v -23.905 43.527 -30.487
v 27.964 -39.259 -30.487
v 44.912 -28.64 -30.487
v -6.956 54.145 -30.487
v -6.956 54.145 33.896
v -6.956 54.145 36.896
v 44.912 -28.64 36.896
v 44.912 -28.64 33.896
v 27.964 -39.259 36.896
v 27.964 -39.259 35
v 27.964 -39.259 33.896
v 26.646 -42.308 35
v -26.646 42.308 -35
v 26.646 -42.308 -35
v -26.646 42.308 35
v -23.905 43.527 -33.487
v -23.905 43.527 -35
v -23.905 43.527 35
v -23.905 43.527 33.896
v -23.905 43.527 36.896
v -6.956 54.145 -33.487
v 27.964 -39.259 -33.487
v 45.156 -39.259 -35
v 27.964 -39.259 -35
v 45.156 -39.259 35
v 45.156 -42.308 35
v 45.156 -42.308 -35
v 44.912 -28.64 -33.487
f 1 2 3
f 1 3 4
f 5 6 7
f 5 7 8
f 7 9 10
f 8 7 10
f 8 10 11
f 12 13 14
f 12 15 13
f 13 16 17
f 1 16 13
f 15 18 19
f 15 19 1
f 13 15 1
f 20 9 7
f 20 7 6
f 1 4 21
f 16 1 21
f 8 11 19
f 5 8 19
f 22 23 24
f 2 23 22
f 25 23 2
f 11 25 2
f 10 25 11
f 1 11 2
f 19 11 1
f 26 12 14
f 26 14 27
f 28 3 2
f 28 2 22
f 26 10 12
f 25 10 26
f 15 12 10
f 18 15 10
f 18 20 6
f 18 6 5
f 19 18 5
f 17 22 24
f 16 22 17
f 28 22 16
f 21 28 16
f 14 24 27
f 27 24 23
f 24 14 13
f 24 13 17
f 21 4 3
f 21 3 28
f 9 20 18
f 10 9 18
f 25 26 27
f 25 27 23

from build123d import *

# Parameters (mm, degrees)
BOSS_EXTRUDE1_DEPTH = 35
SKETCH3_W           = 3
SKETCH3_H           = 97.69244928
EXTRUDE_THIN1_DEPTH = 20


with BuildPart() as part:
    # Sketch1 → Boss-Extrude1 (new, symmetric)
    with BuildSketch(Plane.XY):
        Polygon((-26.646058096, 42.308244917), (26.646058096, -42.308244917), (45.155915247, -42.308244917), (45.155915247, -39.259184306), (27.963657577, -39.259184306), (-23.904623451, 43.526660315), align=None)
    extrude(amount=BOSS_EXTRUDE1_DEPTH, both=True)

    # Sketch3 → Extrude-Thin1 (add)
    with BuildSketch(Plane(origin=(2.417426631, 1.514603909, 0), x_dir=(0, 0, -1), z_dir=(0.8474129293595072, 0.5309343906306494, 0))):
        with Locations((-35.395786922, 0.730616768)):
            Rectangle(SKETCH3_W, SKETCH3_H)
        with Locations((31.987403947, 0.730616768)):
            Rectangle(SKETCH3_W, SKETCH3_H)
    extrude(amount=EXTRUDE_THIN1_DEPTH)


solid = part.part
